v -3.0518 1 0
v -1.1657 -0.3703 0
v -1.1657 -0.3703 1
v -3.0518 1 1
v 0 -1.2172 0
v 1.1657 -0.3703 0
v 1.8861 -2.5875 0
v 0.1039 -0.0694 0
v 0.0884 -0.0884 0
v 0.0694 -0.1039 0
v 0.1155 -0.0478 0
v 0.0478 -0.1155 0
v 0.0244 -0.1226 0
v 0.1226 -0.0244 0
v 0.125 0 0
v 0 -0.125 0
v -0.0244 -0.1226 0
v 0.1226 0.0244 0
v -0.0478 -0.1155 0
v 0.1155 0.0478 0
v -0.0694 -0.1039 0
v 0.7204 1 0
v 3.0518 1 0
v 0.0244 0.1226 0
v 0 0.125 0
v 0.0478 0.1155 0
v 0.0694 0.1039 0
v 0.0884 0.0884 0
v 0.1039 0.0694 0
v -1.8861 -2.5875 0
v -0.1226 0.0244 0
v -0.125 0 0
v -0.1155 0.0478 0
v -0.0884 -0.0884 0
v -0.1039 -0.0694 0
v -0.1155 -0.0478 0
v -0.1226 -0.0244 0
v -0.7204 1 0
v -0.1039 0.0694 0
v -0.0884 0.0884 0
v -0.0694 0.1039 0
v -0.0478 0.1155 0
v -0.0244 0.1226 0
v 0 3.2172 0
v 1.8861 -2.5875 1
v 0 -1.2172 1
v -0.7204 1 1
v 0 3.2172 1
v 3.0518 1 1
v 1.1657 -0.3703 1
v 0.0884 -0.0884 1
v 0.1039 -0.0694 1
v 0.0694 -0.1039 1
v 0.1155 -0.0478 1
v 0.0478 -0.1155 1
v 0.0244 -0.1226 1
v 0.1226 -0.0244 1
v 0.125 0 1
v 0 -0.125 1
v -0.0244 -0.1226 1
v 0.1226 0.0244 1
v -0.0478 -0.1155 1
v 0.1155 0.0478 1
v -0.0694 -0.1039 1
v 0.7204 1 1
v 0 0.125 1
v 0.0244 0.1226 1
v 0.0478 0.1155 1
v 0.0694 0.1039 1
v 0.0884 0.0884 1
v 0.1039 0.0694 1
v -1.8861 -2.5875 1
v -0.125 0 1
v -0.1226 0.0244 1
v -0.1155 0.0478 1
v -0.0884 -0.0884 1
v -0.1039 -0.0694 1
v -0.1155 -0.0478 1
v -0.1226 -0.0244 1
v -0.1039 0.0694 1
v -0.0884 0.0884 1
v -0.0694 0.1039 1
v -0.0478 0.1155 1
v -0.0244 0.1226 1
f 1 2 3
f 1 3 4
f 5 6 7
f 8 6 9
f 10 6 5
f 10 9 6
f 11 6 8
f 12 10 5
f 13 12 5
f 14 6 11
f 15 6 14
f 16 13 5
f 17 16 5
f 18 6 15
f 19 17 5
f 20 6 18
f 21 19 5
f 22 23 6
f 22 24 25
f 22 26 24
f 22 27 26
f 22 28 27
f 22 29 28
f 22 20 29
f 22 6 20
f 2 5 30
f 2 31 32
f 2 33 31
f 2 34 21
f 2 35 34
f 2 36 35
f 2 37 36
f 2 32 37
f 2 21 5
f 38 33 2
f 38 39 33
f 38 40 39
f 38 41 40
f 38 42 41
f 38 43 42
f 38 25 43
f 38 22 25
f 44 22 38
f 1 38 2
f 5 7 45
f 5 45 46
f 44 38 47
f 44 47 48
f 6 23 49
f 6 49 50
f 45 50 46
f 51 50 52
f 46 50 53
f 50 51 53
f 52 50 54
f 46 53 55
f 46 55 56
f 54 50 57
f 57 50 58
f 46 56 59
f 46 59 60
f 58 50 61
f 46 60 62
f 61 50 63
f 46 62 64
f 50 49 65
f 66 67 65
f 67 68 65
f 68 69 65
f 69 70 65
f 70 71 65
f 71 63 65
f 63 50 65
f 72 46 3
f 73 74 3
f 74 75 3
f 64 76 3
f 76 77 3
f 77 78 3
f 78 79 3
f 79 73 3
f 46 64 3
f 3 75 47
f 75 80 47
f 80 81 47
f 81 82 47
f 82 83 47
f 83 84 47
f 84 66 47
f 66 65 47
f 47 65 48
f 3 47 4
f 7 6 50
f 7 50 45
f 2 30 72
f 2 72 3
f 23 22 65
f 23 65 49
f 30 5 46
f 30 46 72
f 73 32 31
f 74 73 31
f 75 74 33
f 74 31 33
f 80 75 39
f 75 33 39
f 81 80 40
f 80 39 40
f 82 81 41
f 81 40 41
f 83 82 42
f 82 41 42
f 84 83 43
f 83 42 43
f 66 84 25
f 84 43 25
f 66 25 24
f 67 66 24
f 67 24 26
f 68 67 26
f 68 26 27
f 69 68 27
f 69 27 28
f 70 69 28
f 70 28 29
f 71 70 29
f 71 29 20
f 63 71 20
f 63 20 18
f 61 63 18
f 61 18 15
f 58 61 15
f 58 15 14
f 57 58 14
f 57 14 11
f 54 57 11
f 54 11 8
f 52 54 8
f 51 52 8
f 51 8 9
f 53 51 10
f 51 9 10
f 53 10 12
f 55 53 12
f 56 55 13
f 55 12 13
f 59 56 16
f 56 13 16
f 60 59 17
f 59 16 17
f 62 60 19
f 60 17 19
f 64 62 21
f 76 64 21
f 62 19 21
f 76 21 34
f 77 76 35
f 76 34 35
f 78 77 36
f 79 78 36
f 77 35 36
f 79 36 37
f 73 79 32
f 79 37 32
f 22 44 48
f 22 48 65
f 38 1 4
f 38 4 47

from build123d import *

# Parameters (mm, degrees)
BOSS_EXTRU_1_DEPTH      = 1
ESQUISSE4_R             = 0.125
ENL_V_MAT_EXTRU_1_DEPTH = 2


with BuildPart() as part:
    # Esquisse3 → Boss.-Extru.1 (new body)
    with BuildSketch(Plane.XY):
        Polygon((0, 3.217227712), (0.720420955, 1), (3.051752136, 1), (1.165665591, -0.370322087), (1.886086545, -2.587549798), (0, -1.217227712), (-1.886086545, -2.587549798), (-1.165665591, -0.370322087), (-3.051752136, 1), (-0.720420955, 1), align=None)
    extrude(amount=BOSS_EXTRU_1_DEPTH)

    # Esquisse4 → Enlèv. mat.-Extru.1 (cut, through all)
    with BuildSketch(Plane(origin=(0, 0, 0), x_dir=(-1, 0, 0), z_dir=(0, 0, -1))):
        Circle(ESQUISSE4_R)
    extrude(amount=-ENL_V_MAT_EXTRU_1_DEPTH, mode=Mode.SUBTRACT)


solid = part.part
